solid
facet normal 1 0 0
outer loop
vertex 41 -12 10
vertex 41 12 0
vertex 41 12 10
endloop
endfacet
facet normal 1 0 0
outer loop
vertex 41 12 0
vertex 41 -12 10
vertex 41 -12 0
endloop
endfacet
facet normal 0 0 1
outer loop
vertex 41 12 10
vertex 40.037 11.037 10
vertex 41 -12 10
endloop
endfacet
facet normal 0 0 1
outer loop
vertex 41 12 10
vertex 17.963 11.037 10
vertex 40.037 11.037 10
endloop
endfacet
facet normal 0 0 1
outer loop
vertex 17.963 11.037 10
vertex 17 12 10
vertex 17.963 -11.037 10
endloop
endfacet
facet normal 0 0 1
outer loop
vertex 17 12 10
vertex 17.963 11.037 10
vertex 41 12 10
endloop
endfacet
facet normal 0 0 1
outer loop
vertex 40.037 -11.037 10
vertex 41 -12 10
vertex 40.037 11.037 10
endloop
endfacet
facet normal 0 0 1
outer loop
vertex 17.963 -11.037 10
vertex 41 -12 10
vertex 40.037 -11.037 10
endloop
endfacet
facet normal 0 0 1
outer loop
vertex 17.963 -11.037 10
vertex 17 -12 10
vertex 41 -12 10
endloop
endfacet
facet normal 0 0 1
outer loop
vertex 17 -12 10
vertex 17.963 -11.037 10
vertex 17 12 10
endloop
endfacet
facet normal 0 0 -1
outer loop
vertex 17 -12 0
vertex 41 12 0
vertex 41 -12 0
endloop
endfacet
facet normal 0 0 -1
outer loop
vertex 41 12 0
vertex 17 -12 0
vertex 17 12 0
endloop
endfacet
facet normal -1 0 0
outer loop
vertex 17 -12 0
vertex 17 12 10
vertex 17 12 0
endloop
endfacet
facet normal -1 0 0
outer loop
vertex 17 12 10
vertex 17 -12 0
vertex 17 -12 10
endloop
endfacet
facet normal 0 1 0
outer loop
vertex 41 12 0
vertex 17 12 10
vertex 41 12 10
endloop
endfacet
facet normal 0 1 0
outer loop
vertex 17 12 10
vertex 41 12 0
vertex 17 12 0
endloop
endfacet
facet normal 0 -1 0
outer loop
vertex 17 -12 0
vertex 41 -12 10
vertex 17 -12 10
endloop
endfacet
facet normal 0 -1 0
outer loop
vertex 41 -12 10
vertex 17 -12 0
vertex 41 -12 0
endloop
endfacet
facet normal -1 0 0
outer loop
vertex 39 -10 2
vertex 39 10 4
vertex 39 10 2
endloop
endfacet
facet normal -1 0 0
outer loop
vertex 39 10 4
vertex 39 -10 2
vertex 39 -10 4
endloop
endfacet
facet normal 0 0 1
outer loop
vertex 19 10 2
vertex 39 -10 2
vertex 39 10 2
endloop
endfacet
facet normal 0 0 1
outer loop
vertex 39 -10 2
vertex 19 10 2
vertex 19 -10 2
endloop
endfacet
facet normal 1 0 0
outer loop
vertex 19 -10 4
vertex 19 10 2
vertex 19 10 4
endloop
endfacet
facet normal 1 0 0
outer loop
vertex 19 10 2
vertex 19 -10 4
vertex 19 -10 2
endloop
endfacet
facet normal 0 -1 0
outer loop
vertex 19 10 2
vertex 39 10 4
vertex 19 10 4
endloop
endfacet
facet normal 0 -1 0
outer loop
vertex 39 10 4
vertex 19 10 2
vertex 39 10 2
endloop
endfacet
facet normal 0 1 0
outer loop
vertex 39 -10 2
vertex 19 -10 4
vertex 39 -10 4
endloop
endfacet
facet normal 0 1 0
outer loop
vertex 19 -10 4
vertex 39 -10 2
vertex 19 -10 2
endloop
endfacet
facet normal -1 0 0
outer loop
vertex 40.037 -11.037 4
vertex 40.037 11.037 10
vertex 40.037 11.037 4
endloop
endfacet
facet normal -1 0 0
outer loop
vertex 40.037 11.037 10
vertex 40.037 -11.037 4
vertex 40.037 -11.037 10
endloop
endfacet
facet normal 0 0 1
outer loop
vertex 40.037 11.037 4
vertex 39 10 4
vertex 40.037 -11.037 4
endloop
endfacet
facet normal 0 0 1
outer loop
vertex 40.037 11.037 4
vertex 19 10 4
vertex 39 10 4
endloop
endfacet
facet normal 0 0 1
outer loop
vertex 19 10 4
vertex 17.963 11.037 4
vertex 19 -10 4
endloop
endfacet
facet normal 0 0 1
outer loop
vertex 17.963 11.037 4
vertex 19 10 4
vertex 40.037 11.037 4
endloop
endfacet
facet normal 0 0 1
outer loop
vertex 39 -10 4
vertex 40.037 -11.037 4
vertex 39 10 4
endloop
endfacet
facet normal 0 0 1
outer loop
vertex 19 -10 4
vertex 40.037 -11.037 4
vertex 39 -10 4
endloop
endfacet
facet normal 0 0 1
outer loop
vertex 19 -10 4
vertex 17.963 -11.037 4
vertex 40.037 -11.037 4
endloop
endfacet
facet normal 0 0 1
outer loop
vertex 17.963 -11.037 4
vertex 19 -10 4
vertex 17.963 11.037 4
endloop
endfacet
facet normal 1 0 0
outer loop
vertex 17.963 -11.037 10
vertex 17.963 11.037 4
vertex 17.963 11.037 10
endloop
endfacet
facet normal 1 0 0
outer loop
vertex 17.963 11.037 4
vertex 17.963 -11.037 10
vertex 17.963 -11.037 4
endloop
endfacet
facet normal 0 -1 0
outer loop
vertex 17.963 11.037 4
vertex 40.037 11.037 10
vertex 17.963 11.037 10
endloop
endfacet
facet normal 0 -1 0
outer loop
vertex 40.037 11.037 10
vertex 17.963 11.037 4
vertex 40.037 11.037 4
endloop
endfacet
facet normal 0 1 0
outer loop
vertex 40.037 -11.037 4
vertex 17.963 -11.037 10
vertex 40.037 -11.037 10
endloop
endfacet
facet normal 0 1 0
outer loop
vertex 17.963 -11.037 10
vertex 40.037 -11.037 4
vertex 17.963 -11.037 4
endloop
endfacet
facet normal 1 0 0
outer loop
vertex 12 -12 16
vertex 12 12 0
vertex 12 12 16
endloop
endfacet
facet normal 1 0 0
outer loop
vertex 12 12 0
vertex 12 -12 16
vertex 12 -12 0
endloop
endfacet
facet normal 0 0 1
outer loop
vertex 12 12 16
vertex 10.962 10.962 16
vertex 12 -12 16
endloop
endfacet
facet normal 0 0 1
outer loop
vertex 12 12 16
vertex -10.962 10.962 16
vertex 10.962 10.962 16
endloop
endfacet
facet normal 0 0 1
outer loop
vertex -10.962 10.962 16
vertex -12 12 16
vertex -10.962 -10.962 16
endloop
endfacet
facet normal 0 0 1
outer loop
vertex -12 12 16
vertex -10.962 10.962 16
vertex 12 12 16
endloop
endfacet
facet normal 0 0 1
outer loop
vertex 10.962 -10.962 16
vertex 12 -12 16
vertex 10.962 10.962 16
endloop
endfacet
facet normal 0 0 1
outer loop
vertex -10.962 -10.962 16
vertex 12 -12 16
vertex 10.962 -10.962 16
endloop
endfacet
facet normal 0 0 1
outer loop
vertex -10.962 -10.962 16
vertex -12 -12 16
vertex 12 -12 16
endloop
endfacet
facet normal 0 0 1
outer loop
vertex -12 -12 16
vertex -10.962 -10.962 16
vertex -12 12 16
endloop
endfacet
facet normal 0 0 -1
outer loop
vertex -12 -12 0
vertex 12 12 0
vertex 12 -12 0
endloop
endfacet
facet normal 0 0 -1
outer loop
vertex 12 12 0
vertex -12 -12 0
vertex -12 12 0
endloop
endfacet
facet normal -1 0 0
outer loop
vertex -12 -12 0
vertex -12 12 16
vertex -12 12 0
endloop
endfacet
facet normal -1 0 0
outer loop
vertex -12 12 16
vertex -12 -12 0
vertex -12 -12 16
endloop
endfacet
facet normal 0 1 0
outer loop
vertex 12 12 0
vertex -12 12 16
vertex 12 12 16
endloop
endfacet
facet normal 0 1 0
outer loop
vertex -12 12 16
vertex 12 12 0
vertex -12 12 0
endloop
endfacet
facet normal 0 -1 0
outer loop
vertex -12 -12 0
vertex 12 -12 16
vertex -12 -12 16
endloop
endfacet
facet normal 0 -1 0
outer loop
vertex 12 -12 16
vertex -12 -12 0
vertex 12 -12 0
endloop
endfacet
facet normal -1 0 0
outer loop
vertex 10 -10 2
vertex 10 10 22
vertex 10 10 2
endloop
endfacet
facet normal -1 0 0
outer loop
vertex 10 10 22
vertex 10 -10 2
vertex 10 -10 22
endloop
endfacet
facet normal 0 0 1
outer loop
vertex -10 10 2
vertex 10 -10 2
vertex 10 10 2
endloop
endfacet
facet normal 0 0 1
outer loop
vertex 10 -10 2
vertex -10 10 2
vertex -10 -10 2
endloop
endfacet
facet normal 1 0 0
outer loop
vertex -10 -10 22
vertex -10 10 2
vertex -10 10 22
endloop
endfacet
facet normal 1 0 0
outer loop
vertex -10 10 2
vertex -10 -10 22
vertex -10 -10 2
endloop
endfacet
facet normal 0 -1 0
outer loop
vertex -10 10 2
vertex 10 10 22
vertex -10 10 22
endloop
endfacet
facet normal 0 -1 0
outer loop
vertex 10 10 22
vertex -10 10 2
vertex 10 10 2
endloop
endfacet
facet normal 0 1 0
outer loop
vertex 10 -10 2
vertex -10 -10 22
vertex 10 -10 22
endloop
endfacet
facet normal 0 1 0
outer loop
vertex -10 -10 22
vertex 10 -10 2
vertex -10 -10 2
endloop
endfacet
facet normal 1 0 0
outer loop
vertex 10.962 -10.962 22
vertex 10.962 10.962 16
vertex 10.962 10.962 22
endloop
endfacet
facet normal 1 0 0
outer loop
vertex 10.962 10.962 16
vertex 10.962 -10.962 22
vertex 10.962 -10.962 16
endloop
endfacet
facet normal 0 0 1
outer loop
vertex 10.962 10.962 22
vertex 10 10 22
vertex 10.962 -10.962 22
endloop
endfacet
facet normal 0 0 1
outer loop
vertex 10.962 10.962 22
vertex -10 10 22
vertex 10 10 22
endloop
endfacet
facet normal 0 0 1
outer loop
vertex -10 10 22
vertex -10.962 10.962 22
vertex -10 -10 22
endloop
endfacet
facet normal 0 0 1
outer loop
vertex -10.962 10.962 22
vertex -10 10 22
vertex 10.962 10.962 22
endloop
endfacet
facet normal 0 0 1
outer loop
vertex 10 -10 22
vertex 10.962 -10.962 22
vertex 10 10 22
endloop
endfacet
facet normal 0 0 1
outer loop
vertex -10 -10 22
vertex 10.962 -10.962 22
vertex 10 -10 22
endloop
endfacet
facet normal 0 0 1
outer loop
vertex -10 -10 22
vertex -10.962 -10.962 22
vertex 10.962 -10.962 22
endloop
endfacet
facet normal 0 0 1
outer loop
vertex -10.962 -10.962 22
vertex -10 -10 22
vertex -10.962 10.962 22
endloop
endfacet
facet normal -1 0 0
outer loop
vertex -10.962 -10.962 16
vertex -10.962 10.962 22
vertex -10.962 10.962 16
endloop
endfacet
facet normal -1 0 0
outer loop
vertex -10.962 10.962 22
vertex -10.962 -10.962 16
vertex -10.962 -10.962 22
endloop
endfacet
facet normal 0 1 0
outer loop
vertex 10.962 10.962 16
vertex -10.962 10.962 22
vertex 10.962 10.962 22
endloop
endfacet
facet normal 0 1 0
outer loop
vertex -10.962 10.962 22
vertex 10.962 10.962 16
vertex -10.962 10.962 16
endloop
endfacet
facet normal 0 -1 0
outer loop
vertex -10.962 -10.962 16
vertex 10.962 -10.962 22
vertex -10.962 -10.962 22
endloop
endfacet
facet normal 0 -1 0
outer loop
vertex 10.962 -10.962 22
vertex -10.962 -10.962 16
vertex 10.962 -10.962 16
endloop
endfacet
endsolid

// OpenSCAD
// Parameters
inner_height = 20; // Inner height of the box
inner_width = 20;  // Inner width of the box
inner_depth = 20;  // Inner depth of the box
wall_thickness = 2; // Thickness of the outer wall
lid_height = 8; // Height of the lid
lid_box_overlap = 6; // Overlap height between lid and box
printer_tolerance = 0.15; // Tolerance for the printer

// Outer dimensions
outer_height = inner_height + wall_thickness * 2;
outer_width = inner_width + wall_thickness * 2;
outer_depth = inner_depth + wall_thickness * 2;

module box() {
    
    difference() {
        translate([0, 0, outer_height / 2  - lid_height / 2  ])
            cube([outer_width, outer_depth, outer_height - lid_height], center = true);

        translate([0, 0, inner_height/2 + wall_thickness])
            cube([inner_width, inner_depth, inner_height], center = true);
    }

    difference() {
        translate([0, 0, outer_height - lid_height + lid_box_overlap / 2])
            cube([outer_width - wall_thickness - printer_tolerance/2, outer_depth - wall_thickness - printer_tolerance/2, lid_box_overlap], center = true);

        translate([0, 0, inner_height/2 + wall_thickness])
            cube([inner_width, inner_depth, inner_height], center = true);
    }
    
}

module sliding_lid() {

    translate([outer_width + 5, 0, lid_height /2 + wall_thickness /2])

        difference() {
            cube([outer_width, outer_depth, lid_height + wall_thickness], center = true);            

            translate([0, 0, wall_thickness])
                cube([inner_width, inner_depth, lid_height + wall_thickness], center = true);
            
            translate([0, 0, lid_height/2 - lid_box_overlap/2 + wall_thickness/2])
                #cube([inner_width + wall_thickness + printer_tolerance/2, inner_depth + wall_thickness + printer_tolerance/2, lid_box_overlap], center = true);
        }
        
}

sliding_lid();

box();
